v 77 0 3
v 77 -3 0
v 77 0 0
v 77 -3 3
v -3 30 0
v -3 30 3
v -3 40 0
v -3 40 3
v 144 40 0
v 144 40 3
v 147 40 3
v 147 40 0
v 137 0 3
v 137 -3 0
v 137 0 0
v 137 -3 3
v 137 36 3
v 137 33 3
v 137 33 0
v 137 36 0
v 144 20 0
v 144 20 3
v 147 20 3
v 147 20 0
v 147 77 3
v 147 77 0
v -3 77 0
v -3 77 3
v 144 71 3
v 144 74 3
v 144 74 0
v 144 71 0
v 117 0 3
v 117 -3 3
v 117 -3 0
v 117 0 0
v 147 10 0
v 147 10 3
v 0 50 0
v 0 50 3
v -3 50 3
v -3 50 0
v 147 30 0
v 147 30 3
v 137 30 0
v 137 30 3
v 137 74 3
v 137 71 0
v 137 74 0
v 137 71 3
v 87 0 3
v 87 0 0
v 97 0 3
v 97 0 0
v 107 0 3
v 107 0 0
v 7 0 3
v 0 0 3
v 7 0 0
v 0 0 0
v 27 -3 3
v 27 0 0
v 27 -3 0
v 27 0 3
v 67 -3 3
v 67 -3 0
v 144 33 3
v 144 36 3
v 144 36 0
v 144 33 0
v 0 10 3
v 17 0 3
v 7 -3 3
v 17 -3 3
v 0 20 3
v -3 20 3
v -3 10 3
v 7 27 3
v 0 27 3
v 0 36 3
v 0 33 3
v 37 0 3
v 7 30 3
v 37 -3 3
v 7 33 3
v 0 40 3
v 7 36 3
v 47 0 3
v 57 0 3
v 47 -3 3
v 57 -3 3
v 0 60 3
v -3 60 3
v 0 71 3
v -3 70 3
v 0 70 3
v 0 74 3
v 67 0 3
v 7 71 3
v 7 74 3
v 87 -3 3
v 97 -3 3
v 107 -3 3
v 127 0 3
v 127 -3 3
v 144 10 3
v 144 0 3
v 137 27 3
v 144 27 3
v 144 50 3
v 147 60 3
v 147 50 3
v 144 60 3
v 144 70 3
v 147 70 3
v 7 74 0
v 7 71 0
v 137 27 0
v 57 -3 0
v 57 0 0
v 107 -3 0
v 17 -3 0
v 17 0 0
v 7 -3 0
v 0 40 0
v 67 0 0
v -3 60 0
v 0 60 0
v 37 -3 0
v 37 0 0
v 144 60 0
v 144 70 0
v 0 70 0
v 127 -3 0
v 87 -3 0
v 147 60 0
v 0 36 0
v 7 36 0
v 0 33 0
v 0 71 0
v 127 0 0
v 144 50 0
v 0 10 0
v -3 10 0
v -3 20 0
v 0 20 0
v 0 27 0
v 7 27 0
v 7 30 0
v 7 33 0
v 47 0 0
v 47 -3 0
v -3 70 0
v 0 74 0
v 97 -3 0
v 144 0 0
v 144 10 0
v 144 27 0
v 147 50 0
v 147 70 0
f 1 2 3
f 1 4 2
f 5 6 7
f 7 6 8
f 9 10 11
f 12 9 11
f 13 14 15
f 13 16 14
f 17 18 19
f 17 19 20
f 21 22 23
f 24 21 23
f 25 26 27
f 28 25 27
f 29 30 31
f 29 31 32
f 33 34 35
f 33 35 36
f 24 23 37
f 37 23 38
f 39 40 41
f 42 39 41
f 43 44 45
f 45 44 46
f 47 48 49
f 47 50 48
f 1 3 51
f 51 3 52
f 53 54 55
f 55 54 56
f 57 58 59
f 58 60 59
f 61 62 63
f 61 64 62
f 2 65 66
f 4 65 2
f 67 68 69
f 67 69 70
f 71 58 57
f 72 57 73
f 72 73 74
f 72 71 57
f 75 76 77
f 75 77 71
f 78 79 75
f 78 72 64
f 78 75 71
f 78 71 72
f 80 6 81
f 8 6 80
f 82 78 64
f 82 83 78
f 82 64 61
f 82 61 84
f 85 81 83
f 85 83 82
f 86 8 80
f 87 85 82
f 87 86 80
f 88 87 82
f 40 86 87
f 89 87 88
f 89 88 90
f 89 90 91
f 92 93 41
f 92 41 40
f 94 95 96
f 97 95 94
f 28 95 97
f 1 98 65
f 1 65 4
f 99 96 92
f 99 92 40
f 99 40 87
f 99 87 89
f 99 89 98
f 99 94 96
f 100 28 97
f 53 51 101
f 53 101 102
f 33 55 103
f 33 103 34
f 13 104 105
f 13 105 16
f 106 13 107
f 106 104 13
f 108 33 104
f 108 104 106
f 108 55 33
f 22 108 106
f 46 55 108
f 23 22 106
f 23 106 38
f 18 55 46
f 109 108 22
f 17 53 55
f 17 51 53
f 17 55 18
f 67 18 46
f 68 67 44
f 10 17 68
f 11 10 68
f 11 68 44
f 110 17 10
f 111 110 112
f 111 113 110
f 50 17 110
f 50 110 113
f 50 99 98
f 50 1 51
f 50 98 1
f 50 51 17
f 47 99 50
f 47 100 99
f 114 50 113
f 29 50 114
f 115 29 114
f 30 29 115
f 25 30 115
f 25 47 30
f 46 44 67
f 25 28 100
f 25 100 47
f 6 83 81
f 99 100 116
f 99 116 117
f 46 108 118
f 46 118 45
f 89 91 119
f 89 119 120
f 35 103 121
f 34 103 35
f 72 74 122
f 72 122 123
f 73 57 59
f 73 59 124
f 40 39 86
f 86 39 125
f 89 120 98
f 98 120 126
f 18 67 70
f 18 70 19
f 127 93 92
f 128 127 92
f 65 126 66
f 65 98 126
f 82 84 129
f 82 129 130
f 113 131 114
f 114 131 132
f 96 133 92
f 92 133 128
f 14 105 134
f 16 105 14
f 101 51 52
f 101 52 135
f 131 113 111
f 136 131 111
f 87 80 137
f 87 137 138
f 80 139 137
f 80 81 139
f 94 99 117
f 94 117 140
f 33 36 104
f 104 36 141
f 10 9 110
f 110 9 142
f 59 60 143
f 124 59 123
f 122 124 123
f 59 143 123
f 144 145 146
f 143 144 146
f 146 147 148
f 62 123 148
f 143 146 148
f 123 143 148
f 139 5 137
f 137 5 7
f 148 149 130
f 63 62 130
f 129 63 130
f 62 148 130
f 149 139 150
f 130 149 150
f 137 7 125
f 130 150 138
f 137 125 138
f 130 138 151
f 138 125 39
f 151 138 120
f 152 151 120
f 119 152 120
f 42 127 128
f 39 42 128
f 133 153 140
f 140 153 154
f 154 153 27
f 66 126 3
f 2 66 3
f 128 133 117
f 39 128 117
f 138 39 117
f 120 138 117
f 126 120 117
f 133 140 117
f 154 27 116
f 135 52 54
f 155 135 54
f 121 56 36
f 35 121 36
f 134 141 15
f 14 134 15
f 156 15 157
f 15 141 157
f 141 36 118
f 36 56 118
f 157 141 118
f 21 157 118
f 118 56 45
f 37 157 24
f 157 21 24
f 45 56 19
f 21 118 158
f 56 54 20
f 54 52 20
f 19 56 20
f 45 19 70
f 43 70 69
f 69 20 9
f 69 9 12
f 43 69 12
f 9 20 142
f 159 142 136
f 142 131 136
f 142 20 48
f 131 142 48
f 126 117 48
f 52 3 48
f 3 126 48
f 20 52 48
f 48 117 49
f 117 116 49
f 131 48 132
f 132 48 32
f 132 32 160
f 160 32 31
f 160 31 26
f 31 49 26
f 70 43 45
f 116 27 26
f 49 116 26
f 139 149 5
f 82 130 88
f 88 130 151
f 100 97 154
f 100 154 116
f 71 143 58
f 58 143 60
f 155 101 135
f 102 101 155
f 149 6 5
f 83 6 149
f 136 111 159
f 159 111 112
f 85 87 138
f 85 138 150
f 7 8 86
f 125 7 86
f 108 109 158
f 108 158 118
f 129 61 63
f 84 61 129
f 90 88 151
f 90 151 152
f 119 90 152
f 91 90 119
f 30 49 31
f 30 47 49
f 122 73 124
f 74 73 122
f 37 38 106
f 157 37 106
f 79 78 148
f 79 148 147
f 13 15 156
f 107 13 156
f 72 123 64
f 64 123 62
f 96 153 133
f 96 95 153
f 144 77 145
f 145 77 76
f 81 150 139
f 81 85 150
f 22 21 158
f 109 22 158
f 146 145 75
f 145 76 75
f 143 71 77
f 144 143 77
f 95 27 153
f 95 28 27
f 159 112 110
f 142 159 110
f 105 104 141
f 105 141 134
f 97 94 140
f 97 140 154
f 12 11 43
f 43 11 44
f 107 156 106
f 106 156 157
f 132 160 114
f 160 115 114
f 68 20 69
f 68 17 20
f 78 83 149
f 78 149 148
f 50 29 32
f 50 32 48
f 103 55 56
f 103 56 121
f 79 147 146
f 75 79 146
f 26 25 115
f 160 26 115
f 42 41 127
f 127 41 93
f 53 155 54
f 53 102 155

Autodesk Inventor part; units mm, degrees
ref_plane "YZ Plane" through (0, 0, 0) normal (1, 0, 0) x (0, 1, 0)
ref_plane "XZ Plane" through (0, 0, 0) normal (0, 1, 0) x (-1, 0, 0)
ref_plane "XY Plane" through (0, 0, 0) normal (0, 0, 1) x (1, 0, 0)
sketch "Sketch1" plane through (0, 0, 0) normal (0, 0, 1) x (1, 0, 0)
  line L0 (0, 0) -> (144, 0)
  line L1 (144, 0) -> (144, 77)
  line L2 (144, 77) -> (0, 77)
  line L3 (0, 77) -> (0, 0)
  dimension "d0" = 144
  dimension "d1" = 77
extrude "Extrusion1" add sketch "Sketch1" along normal blind 3
sketch "Sketch2" plane through (0, 0, 3) normal (0, 0, 1) x (1, 0, 0)
  line L0 (144, 77) -> (0, 77) projected
  line L1 (0, 0) -> (144, 0) projected
  line L2 (0, 77) -> (144, 77)
  line L3 (144, 77) -> (144, 0)
  line L4 (144, 0) -> (0, 0)
  line L5 (0, 0) -> (0, 77)
  line L6 (7, 0) -> (7, -3)
  line L7 (7, -3) -> (17, -3)
  line L8 (17, -3) -> (17, 0)
  line L9 (27, 0) -> (27, -3)
  line L10 (27, -3) -> (37, -3)
  line L11 (37, -3) -> (37, 0)
  line L12 (47, 0) -> (47, -3)
  line L13 (47, -3) -> (57, -3)
  line L14 (57, -3) -> (57, 0)
  line L15 (67, 0) -> (67, -3)
  line L16 (67, -3) -> (77, -3)
  line L17 (77, -3) -> (77, 0)
  line L18 (87, 0) -> (87, -3)
  line L19 (87, -3) -> (97, -3)
  line L20 (97, -3) -> (97, 0)
  line L21 (107, 0) -> (107, -3)
  line L22 (107, -3) -> (117, -3)
  line L23 (117, -3) -> (117, 0)
  line L24 (127, 0) -> (127, -3)
  line L25 (127, -3) -> (137, -3)
  line L26 (137, -3) -> (137, 0)
  line L27 (0, 77) -> (0, 0) projected
  line L28 (0, 10) -> (-3, 10)
  line L29 (-3, 10) -> (-3, 20)
  line L30 (-3, 20) -> (0, 20)
  line L31 (-3, 40) -> (0, 40)
  line L32 (-3, 30) -> (-3, 40)
  line L33 (0, 30) -> (-3, 30)
  line L34 (-3, 60) -> (0, 60)
  line L35 (-3, 50) -> (-3, 60)
  line L36 (0, 50) -> (-3, 50)
  line L37 (144, 77) -> (0, 77) projected
  line L38 (0, 77) -> (-3, 77)
  line L39 (-3, 77) -> (-3, 70)
  line L40 (-3, 70) -> (0, 70)
  line L41 (144, 0) -> (144, 77) projected
  line L42 (144, 77) -> (147, 77)
  line L43 (147, 77) -> (147, 70)
  line L44 (147, 70) -> (144, 70)
  line L45 (144, 0) -> (144, 77) projected
  line L46 (144, 60) -> (147, 60)
  line L47 (147, 60) -> (147, 50)
  line L48 (147, 50) -> (144, 50)
  line L49 (144, 40) -> (147, 40)
  line L50 (147, 40) -> (147, 30)
  line L51 (147, 30) -> (144, 30)
  line L52 (144, 20) -> (147, 20)
  line L53 (147, 20) -> (147, 10)
  line L54 (147, 10) -> (144, 10)
  dimension "d4" = 3
  dimension "d5" = 10
  dimension "d8" = 20
  dimension "d13" = 3
  dimension "d14" = 10
  dimension "d17" = 20
  dimension "d22" = 3
  dimension "d23" = 7
  dimension "d24" = 3
extrude "Extrusion2" add sketch "Sketch2" against normal blind 3 contours L42 L43 L44 L3 | L5 L40 L39 L38 | L46 L47 L48 L3 | L5 L36 L35 L34 | L49 L50 L51 L3 | L5 L33 L32 L31 | L52 L53 L54 L3 | L5 L28 L29 L30 | L26 L25 L24 L1 | L1 L8 L7 L6 | L23 L22 L21 L1 | L1 L11 L10 L9 | L20 L19 L18 L1 | L1 L14 L13 L12 | L17 L16 L15 L1
sketch "Sketch3" plane through (0, 0, 3) normal (0, 0, 1) x (1, 0, 0)
  line L0 (0, 74) -> (7, 74)
  line L1 (7, 74) -> (7, 71)
  line L2 (7, 71) -> (0, 71)
  line L3 (0, 71) -> (0, 74)
  line L4 (137, 74) -> (144, 74)
  line L5 (144, 74) -> (144, 71)
  line L6 (144, 71) -> (137, 71)
  line L7 (137, 71) -> (137, 74)
  line L8 (0, 36) -> (7, 36)
  line L9 (7, 36) -> (7, 33)
  line L10 (7, 33) -> (0, 33)
  line L11 (0, 33) -> (0, 36)
  line L12 (137, 36) -> (144, 36)
  line L13 (144, 36) -> (144, 33)
  line L14 (144, 33) -> (137, 33)
  line L15 (137, 33) -> (137, 36)
  line L16 (7, 30) -> (7, 27)
  line L17 (7, 27) -> (0, 27)
  line L18 (0, 27) -> (0, 30)
  line L19 (0, 30) -> (7, 30)
  line L20 (144, 36) -> (144, 33)
  line L21 (144, 33) -> (137, 33)
  line L22 (137, 33) -> (137, 36)
  line L23 (137, 36) -> (144, 36)
  line L24 (144, 30) -> (144, 27)
  line L25 (144, 27) -> (137, 27)
  line L26 (137, 27) -> (137, 30)
  line L27 (137, 30) -> (144, 30)
  point P0 (0, 0)
  dimension "d27" = 7
  dimension "d28" = 3
  dimension "d31" = 137
  dimension "d34" = 38
  dimension "d41" = 6
  dimension "d44" = 137
extrude "Extrusion3" cut sketch "Sketch3" against normal through all
properties part number "DoosjeVoorkant" material "Wood (Cherry)"
